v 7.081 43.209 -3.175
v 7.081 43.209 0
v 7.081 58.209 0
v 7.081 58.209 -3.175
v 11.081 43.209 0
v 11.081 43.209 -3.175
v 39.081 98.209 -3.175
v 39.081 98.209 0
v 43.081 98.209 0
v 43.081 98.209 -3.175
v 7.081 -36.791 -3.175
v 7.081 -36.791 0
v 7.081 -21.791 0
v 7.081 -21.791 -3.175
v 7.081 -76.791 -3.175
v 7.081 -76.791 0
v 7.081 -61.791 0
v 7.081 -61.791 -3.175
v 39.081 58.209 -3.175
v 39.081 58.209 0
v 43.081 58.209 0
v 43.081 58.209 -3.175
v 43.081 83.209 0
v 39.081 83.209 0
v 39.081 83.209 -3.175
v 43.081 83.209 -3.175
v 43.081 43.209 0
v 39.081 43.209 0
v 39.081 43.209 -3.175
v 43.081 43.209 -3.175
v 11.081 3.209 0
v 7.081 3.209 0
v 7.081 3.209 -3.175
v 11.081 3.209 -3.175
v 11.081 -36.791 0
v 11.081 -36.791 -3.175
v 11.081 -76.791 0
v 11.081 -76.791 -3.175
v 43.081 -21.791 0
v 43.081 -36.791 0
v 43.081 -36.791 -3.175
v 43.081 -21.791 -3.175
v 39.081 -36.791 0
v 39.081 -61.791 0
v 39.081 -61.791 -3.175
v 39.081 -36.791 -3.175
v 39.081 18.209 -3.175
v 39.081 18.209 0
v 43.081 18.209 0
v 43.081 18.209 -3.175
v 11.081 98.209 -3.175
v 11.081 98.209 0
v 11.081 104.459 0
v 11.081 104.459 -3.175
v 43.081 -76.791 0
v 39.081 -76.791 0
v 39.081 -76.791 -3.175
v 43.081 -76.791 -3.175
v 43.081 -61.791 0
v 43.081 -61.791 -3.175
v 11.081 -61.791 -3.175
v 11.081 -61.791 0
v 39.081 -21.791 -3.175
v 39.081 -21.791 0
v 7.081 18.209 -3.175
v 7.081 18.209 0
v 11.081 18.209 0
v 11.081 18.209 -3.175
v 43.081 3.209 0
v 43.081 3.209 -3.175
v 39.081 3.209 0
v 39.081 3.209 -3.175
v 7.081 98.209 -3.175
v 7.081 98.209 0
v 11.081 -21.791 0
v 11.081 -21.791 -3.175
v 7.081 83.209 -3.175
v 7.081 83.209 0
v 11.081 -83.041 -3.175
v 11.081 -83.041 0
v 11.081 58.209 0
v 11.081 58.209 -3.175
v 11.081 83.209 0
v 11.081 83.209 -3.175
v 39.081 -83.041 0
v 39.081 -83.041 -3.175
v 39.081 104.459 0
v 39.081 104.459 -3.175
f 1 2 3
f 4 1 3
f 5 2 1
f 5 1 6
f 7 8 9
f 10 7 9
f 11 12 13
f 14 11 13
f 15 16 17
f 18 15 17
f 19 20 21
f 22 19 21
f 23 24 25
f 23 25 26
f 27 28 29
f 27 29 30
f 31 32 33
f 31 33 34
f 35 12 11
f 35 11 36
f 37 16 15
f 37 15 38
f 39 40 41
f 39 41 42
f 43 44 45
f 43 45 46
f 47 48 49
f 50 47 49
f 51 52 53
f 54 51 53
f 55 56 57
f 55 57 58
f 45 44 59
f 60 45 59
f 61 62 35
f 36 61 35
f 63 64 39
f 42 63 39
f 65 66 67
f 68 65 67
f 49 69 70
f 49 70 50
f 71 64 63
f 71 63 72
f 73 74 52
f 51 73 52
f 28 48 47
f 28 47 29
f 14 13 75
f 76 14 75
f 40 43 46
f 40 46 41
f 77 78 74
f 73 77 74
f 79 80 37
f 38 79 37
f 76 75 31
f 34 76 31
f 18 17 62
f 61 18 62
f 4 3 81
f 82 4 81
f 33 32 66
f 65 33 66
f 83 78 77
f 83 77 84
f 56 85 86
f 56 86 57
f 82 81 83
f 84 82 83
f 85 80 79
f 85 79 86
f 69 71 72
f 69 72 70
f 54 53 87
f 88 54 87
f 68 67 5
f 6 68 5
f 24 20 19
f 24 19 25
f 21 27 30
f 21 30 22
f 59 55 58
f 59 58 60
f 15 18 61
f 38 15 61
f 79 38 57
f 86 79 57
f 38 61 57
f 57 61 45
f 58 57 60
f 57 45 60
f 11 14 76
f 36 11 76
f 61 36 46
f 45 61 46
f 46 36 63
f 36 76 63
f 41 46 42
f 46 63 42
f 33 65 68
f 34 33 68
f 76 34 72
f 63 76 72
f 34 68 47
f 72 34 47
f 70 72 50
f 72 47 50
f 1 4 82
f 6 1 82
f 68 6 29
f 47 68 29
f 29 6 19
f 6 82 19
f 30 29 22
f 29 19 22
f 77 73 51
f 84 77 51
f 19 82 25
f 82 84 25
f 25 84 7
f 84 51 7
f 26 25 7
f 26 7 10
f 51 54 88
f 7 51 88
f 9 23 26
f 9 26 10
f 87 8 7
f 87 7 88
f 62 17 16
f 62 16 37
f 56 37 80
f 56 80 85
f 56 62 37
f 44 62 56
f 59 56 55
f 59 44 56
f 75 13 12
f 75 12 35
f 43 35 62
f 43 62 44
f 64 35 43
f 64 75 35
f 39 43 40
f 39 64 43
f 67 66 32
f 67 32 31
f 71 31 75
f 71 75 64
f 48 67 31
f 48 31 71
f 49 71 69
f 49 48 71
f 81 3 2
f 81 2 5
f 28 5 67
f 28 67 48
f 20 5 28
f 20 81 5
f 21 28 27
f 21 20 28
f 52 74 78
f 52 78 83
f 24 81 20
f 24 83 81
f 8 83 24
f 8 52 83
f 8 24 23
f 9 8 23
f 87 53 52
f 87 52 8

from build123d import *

# Parameters (mm, degrees)
SKETCH1_W          = 36
SKETCH1_H          = 200
BASE_FLANGE1_DEPTH = 3.175
SKETCH2_W          = 4
SKETCH2_H          = 25
CUT_EXTRUDE1_DEPTH = 10
LPATTERN1_COUNT    = 6
LPATTERN1_PITCH    = 40
SKETCH3_W          = 28
SKETCH3_H          = 6.25
CUT_EXTRUDE2_DEPTH = 10


# Sheet-metal steps are written as plain solids
with BuildPart() as part:
    # Sketch1 → Base-Flange1 (new body)
    with BuildSketch(Plane.XY):
        with Locations((25.081146731, 10.708830738)):
            Rectangle(SKETCH1_W, SKETCH1_H)
    extrude(amount=-BASE_FLANGE1_DEPTH)

    # Sketch2 → Cut-Extrude1 (cut)
    with BuildSketch(Plane.XY):
        with Locations((9.081146731, -89.291169262)):
            Rectangle(SKETCH2_W, SKETCH2_H)
        with Locations((41.081146731, -89.291169262)):
            Rectangle(SKETCH2_W, SKETCH2_H)
    cut_extrude1 = extrude(amount=-CUT_EXTRUDE1_DEPTH, mode=Mode.SUBTRACT)

    # LPattern1: Cut-Extrude1 ×6
    with Locations(*[(0, i * LPATTERN1_PITCH, 0) for i in range(1, LPATTERN1_COUNT)]):
        add(cut_extrude1, mode=Mode.SUBTRACT)

    # Sketch3 → Cut-Extrude2 (cut)
    with BuildSketch(Plane.XY):
        with Locations((25.081146731, 107.583830738)):
            Rectangle(SKETCH3_W, SKETCH3_H)
        with Locations((25.081146731, -86.166169262)):
            Rectangle(SKETCH3_W, SKETCH3_H)
    extrude(amount=-CUT_EXTRUDE2_DEPTH, mode=Mode.SUBTRACT)


solid = part.part
